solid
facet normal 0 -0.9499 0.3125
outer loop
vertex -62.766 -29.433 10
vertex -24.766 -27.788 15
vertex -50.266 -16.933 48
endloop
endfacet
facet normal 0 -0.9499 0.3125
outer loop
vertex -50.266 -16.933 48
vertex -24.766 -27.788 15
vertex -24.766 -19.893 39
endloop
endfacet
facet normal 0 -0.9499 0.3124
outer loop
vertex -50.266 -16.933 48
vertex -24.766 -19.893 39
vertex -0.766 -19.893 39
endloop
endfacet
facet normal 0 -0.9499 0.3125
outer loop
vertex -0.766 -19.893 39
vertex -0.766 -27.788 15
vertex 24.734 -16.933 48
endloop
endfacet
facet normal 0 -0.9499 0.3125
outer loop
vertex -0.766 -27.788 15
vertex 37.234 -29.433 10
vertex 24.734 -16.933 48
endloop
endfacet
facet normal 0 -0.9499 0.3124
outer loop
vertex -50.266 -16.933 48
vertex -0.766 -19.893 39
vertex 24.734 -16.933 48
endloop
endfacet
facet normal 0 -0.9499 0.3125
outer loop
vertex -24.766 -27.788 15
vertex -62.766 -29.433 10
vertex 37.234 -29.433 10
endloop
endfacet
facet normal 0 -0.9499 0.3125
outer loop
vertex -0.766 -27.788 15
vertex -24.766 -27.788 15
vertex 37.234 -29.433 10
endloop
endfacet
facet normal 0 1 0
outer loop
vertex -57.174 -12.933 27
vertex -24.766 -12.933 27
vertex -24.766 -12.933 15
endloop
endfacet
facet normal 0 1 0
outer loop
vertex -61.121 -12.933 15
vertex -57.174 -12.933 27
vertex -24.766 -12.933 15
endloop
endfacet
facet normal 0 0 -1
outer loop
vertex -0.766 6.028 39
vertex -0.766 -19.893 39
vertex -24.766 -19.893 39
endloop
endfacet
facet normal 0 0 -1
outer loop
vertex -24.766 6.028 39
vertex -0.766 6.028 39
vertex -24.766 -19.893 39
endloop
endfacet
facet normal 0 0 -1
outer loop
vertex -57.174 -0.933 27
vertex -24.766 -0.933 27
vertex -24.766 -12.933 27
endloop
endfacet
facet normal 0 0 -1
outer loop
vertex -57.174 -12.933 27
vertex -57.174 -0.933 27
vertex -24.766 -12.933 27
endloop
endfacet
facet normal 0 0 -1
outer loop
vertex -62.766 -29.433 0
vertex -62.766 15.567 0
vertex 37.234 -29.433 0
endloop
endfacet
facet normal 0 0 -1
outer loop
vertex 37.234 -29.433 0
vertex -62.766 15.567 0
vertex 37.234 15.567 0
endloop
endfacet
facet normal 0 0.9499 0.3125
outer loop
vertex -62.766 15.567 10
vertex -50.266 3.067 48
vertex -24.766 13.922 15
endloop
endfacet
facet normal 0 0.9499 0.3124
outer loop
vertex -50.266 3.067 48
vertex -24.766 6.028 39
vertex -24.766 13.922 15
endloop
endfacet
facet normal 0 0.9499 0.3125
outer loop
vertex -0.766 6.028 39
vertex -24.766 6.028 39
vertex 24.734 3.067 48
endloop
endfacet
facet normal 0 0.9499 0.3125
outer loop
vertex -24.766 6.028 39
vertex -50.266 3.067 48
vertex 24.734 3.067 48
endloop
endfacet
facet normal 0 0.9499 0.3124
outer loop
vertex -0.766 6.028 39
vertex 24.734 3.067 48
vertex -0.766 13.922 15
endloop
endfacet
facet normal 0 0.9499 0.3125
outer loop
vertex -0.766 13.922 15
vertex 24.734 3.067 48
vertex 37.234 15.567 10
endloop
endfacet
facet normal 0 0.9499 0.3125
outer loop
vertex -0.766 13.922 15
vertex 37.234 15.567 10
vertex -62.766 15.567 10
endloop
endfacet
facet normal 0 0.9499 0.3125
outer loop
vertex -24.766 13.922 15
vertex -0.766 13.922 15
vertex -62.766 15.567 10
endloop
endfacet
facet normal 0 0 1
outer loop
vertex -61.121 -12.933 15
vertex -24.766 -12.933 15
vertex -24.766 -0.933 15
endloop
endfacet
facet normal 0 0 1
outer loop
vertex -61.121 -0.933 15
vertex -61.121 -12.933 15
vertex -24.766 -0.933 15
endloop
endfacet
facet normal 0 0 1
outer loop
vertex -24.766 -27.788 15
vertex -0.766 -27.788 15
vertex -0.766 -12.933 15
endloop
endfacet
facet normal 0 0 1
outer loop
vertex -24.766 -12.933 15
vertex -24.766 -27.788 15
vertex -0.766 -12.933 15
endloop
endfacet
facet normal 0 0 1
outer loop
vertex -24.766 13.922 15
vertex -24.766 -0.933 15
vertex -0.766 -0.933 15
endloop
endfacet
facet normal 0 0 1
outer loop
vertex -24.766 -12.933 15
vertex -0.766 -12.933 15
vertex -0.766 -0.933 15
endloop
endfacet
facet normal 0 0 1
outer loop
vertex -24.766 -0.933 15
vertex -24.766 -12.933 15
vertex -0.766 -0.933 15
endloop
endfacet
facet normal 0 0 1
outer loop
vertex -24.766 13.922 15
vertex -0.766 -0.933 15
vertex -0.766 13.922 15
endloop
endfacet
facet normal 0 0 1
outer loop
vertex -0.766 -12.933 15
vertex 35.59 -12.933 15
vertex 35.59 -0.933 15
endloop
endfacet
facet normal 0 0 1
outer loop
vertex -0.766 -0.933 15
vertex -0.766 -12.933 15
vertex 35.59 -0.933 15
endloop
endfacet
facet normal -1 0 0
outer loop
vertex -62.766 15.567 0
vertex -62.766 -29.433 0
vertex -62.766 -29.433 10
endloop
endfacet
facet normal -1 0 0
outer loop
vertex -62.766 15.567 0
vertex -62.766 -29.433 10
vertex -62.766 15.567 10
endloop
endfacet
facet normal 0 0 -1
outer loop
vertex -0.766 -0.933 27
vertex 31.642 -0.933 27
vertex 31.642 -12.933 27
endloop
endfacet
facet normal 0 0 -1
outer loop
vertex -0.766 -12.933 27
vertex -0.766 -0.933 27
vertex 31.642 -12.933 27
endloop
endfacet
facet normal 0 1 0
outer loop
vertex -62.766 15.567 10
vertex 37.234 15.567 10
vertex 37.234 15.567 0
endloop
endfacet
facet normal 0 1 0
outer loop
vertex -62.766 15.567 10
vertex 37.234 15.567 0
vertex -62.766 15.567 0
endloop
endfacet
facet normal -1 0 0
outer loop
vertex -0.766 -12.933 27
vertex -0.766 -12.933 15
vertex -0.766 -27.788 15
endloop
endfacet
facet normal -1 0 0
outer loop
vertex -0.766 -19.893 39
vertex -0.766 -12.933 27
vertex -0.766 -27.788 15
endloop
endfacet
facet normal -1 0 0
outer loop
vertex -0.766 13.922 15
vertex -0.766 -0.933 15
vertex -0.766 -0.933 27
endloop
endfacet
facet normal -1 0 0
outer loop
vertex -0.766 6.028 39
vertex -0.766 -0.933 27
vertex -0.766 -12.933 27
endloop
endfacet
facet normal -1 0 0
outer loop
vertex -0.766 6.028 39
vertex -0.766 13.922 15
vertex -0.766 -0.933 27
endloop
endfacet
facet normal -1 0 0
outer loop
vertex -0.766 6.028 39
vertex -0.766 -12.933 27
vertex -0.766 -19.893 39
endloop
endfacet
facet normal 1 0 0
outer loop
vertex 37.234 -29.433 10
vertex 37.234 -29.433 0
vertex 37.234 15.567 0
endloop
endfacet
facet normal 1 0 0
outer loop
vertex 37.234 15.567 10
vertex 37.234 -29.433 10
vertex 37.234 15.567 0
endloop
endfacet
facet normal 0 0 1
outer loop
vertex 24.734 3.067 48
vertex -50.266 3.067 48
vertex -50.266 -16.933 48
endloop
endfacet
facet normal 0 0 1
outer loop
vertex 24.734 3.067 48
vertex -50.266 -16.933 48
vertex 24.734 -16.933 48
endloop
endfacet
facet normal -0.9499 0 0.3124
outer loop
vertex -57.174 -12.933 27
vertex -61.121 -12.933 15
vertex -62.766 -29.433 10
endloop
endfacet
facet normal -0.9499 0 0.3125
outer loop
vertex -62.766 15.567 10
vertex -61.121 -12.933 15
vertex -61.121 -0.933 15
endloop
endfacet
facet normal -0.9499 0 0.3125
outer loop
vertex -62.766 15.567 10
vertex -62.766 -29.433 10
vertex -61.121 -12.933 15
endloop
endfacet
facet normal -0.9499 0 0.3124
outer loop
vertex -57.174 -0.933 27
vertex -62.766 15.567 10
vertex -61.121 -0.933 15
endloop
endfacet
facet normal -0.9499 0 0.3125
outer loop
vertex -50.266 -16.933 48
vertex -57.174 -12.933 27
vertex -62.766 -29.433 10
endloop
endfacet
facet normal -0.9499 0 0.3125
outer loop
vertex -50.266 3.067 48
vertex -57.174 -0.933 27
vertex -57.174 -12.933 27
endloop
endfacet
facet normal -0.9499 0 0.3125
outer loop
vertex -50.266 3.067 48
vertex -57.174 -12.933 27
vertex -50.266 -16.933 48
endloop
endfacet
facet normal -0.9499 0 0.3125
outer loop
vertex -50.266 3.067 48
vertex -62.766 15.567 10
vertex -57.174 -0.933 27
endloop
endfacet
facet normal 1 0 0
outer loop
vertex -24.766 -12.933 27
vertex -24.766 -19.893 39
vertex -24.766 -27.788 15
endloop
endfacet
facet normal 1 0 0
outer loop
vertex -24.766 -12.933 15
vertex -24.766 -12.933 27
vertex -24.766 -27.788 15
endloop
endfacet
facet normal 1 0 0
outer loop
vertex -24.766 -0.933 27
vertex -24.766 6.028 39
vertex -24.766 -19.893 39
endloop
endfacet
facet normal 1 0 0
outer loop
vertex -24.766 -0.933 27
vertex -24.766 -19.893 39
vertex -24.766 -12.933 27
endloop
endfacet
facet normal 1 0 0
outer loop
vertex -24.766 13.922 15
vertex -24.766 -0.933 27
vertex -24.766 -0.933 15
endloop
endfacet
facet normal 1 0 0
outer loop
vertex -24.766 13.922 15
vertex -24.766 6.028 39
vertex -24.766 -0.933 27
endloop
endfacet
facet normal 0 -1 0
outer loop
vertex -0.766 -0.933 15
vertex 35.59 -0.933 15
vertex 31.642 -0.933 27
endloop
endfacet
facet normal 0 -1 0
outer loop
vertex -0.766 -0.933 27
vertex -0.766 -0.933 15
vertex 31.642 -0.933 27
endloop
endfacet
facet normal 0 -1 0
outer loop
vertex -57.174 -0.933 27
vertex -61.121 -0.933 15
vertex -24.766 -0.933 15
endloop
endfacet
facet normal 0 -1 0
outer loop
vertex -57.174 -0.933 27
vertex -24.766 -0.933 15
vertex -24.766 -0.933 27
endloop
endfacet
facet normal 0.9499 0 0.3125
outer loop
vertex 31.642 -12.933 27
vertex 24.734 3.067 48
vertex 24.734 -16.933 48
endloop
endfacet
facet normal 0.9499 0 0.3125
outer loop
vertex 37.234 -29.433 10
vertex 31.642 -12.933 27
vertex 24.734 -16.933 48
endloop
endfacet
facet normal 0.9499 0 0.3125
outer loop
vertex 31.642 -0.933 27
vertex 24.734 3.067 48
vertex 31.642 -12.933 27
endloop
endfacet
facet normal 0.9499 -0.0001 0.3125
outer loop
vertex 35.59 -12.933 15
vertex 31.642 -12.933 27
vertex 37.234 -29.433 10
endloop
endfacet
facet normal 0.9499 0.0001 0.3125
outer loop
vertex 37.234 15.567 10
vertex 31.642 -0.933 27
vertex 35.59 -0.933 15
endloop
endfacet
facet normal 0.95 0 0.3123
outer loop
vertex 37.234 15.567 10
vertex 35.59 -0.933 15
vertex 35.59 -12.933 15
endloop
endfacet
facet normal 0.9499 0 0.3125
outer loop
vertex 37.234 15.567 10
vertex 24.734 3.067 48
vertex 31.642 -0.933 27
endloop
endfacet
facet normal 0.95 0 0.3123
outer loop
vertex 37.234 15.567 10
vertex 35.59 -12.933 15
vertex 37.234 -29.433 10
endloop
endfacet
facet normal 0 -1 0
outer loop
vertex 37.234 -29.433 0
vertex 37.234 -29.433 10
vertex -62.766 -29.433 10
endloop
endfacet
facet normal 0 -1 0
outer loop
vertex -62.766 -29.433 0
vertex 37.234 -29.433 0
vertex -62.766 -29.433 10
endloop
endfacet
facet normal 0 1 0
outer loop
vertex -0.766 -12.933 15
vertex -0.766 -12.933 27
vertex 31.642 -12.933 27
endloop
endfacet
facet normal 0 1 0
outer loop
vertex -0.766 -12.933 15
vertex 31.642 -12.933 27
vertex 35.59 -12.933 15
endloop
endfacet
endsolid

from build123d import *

# Parameters (mm, degrees)
F0_W     = 100
F0_H     = 45
F1_DEPTH = 10
F3_DEPTH = 45
F5_DEPTH = 122


with BuildPart() as f1:
    # F0 (on Top) → F1 (new body)
    with BuildSketch(Plane.XY):
        with Locations((-12.765671, -6.932852)):
            Rectangle(F0_W, F0_H)
    extrude(amount=F1_DEPTH)

    # F2 (on face) → F3 (join)
    with BuildSketch(Plane(origin=(0, 15.567148, 0), x_dir=(-1, 0, 0), z_dir=(0, 1, 0))):
        Polygon((12.765671, 39), (12.765671, 48), (-24.734329, 48), (-37.234329, 10), (12.765671, 10), (12.765671, 15), (0.765671, 15), (0.765671, 39), align=None)
        Polygon((50.265671, 48), (12.765671, 48), (12.765671, 39), (24.765671, 39), (24.765671, 15), (12.765671, 15), (12.765671, 10), (62.765671, 10), align=None)
    extrude(amount=-F3_DEPTH)

    # F4 (on face) → F5 (cut)
    with BuildSketch(Plane.YZ.offset(37.234329)):
        Polygon((-29.432852, 10), (-16.932852, 48), (-29.432852, 48), align=None)
        Polygon((15.567148, 48), (3.067148, 48), (15.567148, 10), align=None)
        Polygon((-0.932852, 27), (-6.932852, 27), (-12.932852, 27), (-12.932852, 15), (-0.932852, 15), align=None)
    extrude(amount=-F5_DEPTH, mode=Mode.SUBTRACT)


solid = f1.part
